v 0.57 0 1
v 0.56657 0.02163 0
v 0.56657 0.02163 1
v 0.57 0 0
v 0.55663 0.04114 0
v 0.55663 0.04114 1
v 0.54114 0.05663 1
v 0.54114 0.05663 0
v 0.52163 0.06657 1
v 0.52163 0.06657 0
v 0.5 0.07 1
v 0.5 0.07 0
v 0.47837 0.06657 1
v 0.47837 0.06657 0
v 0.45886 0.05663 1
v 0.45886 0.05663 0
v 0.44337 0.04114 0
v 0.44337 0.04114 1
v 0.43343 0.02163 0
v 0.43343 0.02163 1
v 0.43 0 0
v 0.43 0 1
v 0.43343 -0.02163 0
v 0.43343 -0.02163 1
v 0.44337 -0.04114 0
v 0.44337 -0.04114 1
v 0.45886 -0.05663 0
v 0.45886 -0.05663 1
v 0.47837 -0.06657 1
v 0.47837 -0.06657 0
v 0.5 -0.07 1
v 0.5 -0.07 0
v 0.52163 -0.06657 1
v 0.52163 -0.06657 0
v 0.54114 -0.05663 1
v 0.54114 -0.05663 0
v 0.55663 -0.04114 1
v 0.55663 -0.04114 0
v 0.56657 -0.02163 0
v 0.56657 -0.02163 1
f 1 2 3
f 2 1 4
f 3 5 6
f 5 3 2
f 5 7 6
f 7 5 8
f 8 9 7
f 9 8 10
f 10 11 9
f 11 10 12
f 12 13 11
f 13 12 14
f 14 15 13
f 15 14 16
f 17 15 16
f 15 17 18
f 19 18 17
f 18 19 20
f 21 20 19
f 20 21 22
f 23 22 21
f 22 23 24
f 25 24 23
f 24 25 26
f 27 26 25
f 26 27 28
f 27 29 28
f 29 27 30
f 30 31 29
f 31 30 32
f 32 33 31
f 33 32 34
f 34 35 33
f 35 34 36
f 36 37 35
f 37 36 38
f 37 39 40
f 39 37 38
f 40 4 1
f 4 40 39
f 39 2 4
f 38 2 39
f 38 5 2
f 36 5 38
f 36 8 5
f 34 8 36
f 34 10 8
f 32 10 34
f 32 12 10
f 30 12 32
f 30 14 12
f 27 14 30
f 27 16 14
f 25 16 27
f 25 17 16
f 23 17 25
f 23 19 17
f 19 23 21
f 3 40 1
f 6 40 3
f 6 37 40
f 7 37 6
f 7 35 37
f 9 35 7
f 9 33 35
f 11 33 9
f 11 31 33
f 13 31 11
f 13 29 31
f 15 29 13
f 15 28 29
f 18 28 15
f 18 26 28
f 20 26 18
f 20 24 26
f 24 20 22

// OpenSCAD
color([0.3, 0.3, 0.5])
translate([0.5, 0, 0.0]) {
    cylinder(h = 1.0, r = 0.07, $fn = 20);
}
